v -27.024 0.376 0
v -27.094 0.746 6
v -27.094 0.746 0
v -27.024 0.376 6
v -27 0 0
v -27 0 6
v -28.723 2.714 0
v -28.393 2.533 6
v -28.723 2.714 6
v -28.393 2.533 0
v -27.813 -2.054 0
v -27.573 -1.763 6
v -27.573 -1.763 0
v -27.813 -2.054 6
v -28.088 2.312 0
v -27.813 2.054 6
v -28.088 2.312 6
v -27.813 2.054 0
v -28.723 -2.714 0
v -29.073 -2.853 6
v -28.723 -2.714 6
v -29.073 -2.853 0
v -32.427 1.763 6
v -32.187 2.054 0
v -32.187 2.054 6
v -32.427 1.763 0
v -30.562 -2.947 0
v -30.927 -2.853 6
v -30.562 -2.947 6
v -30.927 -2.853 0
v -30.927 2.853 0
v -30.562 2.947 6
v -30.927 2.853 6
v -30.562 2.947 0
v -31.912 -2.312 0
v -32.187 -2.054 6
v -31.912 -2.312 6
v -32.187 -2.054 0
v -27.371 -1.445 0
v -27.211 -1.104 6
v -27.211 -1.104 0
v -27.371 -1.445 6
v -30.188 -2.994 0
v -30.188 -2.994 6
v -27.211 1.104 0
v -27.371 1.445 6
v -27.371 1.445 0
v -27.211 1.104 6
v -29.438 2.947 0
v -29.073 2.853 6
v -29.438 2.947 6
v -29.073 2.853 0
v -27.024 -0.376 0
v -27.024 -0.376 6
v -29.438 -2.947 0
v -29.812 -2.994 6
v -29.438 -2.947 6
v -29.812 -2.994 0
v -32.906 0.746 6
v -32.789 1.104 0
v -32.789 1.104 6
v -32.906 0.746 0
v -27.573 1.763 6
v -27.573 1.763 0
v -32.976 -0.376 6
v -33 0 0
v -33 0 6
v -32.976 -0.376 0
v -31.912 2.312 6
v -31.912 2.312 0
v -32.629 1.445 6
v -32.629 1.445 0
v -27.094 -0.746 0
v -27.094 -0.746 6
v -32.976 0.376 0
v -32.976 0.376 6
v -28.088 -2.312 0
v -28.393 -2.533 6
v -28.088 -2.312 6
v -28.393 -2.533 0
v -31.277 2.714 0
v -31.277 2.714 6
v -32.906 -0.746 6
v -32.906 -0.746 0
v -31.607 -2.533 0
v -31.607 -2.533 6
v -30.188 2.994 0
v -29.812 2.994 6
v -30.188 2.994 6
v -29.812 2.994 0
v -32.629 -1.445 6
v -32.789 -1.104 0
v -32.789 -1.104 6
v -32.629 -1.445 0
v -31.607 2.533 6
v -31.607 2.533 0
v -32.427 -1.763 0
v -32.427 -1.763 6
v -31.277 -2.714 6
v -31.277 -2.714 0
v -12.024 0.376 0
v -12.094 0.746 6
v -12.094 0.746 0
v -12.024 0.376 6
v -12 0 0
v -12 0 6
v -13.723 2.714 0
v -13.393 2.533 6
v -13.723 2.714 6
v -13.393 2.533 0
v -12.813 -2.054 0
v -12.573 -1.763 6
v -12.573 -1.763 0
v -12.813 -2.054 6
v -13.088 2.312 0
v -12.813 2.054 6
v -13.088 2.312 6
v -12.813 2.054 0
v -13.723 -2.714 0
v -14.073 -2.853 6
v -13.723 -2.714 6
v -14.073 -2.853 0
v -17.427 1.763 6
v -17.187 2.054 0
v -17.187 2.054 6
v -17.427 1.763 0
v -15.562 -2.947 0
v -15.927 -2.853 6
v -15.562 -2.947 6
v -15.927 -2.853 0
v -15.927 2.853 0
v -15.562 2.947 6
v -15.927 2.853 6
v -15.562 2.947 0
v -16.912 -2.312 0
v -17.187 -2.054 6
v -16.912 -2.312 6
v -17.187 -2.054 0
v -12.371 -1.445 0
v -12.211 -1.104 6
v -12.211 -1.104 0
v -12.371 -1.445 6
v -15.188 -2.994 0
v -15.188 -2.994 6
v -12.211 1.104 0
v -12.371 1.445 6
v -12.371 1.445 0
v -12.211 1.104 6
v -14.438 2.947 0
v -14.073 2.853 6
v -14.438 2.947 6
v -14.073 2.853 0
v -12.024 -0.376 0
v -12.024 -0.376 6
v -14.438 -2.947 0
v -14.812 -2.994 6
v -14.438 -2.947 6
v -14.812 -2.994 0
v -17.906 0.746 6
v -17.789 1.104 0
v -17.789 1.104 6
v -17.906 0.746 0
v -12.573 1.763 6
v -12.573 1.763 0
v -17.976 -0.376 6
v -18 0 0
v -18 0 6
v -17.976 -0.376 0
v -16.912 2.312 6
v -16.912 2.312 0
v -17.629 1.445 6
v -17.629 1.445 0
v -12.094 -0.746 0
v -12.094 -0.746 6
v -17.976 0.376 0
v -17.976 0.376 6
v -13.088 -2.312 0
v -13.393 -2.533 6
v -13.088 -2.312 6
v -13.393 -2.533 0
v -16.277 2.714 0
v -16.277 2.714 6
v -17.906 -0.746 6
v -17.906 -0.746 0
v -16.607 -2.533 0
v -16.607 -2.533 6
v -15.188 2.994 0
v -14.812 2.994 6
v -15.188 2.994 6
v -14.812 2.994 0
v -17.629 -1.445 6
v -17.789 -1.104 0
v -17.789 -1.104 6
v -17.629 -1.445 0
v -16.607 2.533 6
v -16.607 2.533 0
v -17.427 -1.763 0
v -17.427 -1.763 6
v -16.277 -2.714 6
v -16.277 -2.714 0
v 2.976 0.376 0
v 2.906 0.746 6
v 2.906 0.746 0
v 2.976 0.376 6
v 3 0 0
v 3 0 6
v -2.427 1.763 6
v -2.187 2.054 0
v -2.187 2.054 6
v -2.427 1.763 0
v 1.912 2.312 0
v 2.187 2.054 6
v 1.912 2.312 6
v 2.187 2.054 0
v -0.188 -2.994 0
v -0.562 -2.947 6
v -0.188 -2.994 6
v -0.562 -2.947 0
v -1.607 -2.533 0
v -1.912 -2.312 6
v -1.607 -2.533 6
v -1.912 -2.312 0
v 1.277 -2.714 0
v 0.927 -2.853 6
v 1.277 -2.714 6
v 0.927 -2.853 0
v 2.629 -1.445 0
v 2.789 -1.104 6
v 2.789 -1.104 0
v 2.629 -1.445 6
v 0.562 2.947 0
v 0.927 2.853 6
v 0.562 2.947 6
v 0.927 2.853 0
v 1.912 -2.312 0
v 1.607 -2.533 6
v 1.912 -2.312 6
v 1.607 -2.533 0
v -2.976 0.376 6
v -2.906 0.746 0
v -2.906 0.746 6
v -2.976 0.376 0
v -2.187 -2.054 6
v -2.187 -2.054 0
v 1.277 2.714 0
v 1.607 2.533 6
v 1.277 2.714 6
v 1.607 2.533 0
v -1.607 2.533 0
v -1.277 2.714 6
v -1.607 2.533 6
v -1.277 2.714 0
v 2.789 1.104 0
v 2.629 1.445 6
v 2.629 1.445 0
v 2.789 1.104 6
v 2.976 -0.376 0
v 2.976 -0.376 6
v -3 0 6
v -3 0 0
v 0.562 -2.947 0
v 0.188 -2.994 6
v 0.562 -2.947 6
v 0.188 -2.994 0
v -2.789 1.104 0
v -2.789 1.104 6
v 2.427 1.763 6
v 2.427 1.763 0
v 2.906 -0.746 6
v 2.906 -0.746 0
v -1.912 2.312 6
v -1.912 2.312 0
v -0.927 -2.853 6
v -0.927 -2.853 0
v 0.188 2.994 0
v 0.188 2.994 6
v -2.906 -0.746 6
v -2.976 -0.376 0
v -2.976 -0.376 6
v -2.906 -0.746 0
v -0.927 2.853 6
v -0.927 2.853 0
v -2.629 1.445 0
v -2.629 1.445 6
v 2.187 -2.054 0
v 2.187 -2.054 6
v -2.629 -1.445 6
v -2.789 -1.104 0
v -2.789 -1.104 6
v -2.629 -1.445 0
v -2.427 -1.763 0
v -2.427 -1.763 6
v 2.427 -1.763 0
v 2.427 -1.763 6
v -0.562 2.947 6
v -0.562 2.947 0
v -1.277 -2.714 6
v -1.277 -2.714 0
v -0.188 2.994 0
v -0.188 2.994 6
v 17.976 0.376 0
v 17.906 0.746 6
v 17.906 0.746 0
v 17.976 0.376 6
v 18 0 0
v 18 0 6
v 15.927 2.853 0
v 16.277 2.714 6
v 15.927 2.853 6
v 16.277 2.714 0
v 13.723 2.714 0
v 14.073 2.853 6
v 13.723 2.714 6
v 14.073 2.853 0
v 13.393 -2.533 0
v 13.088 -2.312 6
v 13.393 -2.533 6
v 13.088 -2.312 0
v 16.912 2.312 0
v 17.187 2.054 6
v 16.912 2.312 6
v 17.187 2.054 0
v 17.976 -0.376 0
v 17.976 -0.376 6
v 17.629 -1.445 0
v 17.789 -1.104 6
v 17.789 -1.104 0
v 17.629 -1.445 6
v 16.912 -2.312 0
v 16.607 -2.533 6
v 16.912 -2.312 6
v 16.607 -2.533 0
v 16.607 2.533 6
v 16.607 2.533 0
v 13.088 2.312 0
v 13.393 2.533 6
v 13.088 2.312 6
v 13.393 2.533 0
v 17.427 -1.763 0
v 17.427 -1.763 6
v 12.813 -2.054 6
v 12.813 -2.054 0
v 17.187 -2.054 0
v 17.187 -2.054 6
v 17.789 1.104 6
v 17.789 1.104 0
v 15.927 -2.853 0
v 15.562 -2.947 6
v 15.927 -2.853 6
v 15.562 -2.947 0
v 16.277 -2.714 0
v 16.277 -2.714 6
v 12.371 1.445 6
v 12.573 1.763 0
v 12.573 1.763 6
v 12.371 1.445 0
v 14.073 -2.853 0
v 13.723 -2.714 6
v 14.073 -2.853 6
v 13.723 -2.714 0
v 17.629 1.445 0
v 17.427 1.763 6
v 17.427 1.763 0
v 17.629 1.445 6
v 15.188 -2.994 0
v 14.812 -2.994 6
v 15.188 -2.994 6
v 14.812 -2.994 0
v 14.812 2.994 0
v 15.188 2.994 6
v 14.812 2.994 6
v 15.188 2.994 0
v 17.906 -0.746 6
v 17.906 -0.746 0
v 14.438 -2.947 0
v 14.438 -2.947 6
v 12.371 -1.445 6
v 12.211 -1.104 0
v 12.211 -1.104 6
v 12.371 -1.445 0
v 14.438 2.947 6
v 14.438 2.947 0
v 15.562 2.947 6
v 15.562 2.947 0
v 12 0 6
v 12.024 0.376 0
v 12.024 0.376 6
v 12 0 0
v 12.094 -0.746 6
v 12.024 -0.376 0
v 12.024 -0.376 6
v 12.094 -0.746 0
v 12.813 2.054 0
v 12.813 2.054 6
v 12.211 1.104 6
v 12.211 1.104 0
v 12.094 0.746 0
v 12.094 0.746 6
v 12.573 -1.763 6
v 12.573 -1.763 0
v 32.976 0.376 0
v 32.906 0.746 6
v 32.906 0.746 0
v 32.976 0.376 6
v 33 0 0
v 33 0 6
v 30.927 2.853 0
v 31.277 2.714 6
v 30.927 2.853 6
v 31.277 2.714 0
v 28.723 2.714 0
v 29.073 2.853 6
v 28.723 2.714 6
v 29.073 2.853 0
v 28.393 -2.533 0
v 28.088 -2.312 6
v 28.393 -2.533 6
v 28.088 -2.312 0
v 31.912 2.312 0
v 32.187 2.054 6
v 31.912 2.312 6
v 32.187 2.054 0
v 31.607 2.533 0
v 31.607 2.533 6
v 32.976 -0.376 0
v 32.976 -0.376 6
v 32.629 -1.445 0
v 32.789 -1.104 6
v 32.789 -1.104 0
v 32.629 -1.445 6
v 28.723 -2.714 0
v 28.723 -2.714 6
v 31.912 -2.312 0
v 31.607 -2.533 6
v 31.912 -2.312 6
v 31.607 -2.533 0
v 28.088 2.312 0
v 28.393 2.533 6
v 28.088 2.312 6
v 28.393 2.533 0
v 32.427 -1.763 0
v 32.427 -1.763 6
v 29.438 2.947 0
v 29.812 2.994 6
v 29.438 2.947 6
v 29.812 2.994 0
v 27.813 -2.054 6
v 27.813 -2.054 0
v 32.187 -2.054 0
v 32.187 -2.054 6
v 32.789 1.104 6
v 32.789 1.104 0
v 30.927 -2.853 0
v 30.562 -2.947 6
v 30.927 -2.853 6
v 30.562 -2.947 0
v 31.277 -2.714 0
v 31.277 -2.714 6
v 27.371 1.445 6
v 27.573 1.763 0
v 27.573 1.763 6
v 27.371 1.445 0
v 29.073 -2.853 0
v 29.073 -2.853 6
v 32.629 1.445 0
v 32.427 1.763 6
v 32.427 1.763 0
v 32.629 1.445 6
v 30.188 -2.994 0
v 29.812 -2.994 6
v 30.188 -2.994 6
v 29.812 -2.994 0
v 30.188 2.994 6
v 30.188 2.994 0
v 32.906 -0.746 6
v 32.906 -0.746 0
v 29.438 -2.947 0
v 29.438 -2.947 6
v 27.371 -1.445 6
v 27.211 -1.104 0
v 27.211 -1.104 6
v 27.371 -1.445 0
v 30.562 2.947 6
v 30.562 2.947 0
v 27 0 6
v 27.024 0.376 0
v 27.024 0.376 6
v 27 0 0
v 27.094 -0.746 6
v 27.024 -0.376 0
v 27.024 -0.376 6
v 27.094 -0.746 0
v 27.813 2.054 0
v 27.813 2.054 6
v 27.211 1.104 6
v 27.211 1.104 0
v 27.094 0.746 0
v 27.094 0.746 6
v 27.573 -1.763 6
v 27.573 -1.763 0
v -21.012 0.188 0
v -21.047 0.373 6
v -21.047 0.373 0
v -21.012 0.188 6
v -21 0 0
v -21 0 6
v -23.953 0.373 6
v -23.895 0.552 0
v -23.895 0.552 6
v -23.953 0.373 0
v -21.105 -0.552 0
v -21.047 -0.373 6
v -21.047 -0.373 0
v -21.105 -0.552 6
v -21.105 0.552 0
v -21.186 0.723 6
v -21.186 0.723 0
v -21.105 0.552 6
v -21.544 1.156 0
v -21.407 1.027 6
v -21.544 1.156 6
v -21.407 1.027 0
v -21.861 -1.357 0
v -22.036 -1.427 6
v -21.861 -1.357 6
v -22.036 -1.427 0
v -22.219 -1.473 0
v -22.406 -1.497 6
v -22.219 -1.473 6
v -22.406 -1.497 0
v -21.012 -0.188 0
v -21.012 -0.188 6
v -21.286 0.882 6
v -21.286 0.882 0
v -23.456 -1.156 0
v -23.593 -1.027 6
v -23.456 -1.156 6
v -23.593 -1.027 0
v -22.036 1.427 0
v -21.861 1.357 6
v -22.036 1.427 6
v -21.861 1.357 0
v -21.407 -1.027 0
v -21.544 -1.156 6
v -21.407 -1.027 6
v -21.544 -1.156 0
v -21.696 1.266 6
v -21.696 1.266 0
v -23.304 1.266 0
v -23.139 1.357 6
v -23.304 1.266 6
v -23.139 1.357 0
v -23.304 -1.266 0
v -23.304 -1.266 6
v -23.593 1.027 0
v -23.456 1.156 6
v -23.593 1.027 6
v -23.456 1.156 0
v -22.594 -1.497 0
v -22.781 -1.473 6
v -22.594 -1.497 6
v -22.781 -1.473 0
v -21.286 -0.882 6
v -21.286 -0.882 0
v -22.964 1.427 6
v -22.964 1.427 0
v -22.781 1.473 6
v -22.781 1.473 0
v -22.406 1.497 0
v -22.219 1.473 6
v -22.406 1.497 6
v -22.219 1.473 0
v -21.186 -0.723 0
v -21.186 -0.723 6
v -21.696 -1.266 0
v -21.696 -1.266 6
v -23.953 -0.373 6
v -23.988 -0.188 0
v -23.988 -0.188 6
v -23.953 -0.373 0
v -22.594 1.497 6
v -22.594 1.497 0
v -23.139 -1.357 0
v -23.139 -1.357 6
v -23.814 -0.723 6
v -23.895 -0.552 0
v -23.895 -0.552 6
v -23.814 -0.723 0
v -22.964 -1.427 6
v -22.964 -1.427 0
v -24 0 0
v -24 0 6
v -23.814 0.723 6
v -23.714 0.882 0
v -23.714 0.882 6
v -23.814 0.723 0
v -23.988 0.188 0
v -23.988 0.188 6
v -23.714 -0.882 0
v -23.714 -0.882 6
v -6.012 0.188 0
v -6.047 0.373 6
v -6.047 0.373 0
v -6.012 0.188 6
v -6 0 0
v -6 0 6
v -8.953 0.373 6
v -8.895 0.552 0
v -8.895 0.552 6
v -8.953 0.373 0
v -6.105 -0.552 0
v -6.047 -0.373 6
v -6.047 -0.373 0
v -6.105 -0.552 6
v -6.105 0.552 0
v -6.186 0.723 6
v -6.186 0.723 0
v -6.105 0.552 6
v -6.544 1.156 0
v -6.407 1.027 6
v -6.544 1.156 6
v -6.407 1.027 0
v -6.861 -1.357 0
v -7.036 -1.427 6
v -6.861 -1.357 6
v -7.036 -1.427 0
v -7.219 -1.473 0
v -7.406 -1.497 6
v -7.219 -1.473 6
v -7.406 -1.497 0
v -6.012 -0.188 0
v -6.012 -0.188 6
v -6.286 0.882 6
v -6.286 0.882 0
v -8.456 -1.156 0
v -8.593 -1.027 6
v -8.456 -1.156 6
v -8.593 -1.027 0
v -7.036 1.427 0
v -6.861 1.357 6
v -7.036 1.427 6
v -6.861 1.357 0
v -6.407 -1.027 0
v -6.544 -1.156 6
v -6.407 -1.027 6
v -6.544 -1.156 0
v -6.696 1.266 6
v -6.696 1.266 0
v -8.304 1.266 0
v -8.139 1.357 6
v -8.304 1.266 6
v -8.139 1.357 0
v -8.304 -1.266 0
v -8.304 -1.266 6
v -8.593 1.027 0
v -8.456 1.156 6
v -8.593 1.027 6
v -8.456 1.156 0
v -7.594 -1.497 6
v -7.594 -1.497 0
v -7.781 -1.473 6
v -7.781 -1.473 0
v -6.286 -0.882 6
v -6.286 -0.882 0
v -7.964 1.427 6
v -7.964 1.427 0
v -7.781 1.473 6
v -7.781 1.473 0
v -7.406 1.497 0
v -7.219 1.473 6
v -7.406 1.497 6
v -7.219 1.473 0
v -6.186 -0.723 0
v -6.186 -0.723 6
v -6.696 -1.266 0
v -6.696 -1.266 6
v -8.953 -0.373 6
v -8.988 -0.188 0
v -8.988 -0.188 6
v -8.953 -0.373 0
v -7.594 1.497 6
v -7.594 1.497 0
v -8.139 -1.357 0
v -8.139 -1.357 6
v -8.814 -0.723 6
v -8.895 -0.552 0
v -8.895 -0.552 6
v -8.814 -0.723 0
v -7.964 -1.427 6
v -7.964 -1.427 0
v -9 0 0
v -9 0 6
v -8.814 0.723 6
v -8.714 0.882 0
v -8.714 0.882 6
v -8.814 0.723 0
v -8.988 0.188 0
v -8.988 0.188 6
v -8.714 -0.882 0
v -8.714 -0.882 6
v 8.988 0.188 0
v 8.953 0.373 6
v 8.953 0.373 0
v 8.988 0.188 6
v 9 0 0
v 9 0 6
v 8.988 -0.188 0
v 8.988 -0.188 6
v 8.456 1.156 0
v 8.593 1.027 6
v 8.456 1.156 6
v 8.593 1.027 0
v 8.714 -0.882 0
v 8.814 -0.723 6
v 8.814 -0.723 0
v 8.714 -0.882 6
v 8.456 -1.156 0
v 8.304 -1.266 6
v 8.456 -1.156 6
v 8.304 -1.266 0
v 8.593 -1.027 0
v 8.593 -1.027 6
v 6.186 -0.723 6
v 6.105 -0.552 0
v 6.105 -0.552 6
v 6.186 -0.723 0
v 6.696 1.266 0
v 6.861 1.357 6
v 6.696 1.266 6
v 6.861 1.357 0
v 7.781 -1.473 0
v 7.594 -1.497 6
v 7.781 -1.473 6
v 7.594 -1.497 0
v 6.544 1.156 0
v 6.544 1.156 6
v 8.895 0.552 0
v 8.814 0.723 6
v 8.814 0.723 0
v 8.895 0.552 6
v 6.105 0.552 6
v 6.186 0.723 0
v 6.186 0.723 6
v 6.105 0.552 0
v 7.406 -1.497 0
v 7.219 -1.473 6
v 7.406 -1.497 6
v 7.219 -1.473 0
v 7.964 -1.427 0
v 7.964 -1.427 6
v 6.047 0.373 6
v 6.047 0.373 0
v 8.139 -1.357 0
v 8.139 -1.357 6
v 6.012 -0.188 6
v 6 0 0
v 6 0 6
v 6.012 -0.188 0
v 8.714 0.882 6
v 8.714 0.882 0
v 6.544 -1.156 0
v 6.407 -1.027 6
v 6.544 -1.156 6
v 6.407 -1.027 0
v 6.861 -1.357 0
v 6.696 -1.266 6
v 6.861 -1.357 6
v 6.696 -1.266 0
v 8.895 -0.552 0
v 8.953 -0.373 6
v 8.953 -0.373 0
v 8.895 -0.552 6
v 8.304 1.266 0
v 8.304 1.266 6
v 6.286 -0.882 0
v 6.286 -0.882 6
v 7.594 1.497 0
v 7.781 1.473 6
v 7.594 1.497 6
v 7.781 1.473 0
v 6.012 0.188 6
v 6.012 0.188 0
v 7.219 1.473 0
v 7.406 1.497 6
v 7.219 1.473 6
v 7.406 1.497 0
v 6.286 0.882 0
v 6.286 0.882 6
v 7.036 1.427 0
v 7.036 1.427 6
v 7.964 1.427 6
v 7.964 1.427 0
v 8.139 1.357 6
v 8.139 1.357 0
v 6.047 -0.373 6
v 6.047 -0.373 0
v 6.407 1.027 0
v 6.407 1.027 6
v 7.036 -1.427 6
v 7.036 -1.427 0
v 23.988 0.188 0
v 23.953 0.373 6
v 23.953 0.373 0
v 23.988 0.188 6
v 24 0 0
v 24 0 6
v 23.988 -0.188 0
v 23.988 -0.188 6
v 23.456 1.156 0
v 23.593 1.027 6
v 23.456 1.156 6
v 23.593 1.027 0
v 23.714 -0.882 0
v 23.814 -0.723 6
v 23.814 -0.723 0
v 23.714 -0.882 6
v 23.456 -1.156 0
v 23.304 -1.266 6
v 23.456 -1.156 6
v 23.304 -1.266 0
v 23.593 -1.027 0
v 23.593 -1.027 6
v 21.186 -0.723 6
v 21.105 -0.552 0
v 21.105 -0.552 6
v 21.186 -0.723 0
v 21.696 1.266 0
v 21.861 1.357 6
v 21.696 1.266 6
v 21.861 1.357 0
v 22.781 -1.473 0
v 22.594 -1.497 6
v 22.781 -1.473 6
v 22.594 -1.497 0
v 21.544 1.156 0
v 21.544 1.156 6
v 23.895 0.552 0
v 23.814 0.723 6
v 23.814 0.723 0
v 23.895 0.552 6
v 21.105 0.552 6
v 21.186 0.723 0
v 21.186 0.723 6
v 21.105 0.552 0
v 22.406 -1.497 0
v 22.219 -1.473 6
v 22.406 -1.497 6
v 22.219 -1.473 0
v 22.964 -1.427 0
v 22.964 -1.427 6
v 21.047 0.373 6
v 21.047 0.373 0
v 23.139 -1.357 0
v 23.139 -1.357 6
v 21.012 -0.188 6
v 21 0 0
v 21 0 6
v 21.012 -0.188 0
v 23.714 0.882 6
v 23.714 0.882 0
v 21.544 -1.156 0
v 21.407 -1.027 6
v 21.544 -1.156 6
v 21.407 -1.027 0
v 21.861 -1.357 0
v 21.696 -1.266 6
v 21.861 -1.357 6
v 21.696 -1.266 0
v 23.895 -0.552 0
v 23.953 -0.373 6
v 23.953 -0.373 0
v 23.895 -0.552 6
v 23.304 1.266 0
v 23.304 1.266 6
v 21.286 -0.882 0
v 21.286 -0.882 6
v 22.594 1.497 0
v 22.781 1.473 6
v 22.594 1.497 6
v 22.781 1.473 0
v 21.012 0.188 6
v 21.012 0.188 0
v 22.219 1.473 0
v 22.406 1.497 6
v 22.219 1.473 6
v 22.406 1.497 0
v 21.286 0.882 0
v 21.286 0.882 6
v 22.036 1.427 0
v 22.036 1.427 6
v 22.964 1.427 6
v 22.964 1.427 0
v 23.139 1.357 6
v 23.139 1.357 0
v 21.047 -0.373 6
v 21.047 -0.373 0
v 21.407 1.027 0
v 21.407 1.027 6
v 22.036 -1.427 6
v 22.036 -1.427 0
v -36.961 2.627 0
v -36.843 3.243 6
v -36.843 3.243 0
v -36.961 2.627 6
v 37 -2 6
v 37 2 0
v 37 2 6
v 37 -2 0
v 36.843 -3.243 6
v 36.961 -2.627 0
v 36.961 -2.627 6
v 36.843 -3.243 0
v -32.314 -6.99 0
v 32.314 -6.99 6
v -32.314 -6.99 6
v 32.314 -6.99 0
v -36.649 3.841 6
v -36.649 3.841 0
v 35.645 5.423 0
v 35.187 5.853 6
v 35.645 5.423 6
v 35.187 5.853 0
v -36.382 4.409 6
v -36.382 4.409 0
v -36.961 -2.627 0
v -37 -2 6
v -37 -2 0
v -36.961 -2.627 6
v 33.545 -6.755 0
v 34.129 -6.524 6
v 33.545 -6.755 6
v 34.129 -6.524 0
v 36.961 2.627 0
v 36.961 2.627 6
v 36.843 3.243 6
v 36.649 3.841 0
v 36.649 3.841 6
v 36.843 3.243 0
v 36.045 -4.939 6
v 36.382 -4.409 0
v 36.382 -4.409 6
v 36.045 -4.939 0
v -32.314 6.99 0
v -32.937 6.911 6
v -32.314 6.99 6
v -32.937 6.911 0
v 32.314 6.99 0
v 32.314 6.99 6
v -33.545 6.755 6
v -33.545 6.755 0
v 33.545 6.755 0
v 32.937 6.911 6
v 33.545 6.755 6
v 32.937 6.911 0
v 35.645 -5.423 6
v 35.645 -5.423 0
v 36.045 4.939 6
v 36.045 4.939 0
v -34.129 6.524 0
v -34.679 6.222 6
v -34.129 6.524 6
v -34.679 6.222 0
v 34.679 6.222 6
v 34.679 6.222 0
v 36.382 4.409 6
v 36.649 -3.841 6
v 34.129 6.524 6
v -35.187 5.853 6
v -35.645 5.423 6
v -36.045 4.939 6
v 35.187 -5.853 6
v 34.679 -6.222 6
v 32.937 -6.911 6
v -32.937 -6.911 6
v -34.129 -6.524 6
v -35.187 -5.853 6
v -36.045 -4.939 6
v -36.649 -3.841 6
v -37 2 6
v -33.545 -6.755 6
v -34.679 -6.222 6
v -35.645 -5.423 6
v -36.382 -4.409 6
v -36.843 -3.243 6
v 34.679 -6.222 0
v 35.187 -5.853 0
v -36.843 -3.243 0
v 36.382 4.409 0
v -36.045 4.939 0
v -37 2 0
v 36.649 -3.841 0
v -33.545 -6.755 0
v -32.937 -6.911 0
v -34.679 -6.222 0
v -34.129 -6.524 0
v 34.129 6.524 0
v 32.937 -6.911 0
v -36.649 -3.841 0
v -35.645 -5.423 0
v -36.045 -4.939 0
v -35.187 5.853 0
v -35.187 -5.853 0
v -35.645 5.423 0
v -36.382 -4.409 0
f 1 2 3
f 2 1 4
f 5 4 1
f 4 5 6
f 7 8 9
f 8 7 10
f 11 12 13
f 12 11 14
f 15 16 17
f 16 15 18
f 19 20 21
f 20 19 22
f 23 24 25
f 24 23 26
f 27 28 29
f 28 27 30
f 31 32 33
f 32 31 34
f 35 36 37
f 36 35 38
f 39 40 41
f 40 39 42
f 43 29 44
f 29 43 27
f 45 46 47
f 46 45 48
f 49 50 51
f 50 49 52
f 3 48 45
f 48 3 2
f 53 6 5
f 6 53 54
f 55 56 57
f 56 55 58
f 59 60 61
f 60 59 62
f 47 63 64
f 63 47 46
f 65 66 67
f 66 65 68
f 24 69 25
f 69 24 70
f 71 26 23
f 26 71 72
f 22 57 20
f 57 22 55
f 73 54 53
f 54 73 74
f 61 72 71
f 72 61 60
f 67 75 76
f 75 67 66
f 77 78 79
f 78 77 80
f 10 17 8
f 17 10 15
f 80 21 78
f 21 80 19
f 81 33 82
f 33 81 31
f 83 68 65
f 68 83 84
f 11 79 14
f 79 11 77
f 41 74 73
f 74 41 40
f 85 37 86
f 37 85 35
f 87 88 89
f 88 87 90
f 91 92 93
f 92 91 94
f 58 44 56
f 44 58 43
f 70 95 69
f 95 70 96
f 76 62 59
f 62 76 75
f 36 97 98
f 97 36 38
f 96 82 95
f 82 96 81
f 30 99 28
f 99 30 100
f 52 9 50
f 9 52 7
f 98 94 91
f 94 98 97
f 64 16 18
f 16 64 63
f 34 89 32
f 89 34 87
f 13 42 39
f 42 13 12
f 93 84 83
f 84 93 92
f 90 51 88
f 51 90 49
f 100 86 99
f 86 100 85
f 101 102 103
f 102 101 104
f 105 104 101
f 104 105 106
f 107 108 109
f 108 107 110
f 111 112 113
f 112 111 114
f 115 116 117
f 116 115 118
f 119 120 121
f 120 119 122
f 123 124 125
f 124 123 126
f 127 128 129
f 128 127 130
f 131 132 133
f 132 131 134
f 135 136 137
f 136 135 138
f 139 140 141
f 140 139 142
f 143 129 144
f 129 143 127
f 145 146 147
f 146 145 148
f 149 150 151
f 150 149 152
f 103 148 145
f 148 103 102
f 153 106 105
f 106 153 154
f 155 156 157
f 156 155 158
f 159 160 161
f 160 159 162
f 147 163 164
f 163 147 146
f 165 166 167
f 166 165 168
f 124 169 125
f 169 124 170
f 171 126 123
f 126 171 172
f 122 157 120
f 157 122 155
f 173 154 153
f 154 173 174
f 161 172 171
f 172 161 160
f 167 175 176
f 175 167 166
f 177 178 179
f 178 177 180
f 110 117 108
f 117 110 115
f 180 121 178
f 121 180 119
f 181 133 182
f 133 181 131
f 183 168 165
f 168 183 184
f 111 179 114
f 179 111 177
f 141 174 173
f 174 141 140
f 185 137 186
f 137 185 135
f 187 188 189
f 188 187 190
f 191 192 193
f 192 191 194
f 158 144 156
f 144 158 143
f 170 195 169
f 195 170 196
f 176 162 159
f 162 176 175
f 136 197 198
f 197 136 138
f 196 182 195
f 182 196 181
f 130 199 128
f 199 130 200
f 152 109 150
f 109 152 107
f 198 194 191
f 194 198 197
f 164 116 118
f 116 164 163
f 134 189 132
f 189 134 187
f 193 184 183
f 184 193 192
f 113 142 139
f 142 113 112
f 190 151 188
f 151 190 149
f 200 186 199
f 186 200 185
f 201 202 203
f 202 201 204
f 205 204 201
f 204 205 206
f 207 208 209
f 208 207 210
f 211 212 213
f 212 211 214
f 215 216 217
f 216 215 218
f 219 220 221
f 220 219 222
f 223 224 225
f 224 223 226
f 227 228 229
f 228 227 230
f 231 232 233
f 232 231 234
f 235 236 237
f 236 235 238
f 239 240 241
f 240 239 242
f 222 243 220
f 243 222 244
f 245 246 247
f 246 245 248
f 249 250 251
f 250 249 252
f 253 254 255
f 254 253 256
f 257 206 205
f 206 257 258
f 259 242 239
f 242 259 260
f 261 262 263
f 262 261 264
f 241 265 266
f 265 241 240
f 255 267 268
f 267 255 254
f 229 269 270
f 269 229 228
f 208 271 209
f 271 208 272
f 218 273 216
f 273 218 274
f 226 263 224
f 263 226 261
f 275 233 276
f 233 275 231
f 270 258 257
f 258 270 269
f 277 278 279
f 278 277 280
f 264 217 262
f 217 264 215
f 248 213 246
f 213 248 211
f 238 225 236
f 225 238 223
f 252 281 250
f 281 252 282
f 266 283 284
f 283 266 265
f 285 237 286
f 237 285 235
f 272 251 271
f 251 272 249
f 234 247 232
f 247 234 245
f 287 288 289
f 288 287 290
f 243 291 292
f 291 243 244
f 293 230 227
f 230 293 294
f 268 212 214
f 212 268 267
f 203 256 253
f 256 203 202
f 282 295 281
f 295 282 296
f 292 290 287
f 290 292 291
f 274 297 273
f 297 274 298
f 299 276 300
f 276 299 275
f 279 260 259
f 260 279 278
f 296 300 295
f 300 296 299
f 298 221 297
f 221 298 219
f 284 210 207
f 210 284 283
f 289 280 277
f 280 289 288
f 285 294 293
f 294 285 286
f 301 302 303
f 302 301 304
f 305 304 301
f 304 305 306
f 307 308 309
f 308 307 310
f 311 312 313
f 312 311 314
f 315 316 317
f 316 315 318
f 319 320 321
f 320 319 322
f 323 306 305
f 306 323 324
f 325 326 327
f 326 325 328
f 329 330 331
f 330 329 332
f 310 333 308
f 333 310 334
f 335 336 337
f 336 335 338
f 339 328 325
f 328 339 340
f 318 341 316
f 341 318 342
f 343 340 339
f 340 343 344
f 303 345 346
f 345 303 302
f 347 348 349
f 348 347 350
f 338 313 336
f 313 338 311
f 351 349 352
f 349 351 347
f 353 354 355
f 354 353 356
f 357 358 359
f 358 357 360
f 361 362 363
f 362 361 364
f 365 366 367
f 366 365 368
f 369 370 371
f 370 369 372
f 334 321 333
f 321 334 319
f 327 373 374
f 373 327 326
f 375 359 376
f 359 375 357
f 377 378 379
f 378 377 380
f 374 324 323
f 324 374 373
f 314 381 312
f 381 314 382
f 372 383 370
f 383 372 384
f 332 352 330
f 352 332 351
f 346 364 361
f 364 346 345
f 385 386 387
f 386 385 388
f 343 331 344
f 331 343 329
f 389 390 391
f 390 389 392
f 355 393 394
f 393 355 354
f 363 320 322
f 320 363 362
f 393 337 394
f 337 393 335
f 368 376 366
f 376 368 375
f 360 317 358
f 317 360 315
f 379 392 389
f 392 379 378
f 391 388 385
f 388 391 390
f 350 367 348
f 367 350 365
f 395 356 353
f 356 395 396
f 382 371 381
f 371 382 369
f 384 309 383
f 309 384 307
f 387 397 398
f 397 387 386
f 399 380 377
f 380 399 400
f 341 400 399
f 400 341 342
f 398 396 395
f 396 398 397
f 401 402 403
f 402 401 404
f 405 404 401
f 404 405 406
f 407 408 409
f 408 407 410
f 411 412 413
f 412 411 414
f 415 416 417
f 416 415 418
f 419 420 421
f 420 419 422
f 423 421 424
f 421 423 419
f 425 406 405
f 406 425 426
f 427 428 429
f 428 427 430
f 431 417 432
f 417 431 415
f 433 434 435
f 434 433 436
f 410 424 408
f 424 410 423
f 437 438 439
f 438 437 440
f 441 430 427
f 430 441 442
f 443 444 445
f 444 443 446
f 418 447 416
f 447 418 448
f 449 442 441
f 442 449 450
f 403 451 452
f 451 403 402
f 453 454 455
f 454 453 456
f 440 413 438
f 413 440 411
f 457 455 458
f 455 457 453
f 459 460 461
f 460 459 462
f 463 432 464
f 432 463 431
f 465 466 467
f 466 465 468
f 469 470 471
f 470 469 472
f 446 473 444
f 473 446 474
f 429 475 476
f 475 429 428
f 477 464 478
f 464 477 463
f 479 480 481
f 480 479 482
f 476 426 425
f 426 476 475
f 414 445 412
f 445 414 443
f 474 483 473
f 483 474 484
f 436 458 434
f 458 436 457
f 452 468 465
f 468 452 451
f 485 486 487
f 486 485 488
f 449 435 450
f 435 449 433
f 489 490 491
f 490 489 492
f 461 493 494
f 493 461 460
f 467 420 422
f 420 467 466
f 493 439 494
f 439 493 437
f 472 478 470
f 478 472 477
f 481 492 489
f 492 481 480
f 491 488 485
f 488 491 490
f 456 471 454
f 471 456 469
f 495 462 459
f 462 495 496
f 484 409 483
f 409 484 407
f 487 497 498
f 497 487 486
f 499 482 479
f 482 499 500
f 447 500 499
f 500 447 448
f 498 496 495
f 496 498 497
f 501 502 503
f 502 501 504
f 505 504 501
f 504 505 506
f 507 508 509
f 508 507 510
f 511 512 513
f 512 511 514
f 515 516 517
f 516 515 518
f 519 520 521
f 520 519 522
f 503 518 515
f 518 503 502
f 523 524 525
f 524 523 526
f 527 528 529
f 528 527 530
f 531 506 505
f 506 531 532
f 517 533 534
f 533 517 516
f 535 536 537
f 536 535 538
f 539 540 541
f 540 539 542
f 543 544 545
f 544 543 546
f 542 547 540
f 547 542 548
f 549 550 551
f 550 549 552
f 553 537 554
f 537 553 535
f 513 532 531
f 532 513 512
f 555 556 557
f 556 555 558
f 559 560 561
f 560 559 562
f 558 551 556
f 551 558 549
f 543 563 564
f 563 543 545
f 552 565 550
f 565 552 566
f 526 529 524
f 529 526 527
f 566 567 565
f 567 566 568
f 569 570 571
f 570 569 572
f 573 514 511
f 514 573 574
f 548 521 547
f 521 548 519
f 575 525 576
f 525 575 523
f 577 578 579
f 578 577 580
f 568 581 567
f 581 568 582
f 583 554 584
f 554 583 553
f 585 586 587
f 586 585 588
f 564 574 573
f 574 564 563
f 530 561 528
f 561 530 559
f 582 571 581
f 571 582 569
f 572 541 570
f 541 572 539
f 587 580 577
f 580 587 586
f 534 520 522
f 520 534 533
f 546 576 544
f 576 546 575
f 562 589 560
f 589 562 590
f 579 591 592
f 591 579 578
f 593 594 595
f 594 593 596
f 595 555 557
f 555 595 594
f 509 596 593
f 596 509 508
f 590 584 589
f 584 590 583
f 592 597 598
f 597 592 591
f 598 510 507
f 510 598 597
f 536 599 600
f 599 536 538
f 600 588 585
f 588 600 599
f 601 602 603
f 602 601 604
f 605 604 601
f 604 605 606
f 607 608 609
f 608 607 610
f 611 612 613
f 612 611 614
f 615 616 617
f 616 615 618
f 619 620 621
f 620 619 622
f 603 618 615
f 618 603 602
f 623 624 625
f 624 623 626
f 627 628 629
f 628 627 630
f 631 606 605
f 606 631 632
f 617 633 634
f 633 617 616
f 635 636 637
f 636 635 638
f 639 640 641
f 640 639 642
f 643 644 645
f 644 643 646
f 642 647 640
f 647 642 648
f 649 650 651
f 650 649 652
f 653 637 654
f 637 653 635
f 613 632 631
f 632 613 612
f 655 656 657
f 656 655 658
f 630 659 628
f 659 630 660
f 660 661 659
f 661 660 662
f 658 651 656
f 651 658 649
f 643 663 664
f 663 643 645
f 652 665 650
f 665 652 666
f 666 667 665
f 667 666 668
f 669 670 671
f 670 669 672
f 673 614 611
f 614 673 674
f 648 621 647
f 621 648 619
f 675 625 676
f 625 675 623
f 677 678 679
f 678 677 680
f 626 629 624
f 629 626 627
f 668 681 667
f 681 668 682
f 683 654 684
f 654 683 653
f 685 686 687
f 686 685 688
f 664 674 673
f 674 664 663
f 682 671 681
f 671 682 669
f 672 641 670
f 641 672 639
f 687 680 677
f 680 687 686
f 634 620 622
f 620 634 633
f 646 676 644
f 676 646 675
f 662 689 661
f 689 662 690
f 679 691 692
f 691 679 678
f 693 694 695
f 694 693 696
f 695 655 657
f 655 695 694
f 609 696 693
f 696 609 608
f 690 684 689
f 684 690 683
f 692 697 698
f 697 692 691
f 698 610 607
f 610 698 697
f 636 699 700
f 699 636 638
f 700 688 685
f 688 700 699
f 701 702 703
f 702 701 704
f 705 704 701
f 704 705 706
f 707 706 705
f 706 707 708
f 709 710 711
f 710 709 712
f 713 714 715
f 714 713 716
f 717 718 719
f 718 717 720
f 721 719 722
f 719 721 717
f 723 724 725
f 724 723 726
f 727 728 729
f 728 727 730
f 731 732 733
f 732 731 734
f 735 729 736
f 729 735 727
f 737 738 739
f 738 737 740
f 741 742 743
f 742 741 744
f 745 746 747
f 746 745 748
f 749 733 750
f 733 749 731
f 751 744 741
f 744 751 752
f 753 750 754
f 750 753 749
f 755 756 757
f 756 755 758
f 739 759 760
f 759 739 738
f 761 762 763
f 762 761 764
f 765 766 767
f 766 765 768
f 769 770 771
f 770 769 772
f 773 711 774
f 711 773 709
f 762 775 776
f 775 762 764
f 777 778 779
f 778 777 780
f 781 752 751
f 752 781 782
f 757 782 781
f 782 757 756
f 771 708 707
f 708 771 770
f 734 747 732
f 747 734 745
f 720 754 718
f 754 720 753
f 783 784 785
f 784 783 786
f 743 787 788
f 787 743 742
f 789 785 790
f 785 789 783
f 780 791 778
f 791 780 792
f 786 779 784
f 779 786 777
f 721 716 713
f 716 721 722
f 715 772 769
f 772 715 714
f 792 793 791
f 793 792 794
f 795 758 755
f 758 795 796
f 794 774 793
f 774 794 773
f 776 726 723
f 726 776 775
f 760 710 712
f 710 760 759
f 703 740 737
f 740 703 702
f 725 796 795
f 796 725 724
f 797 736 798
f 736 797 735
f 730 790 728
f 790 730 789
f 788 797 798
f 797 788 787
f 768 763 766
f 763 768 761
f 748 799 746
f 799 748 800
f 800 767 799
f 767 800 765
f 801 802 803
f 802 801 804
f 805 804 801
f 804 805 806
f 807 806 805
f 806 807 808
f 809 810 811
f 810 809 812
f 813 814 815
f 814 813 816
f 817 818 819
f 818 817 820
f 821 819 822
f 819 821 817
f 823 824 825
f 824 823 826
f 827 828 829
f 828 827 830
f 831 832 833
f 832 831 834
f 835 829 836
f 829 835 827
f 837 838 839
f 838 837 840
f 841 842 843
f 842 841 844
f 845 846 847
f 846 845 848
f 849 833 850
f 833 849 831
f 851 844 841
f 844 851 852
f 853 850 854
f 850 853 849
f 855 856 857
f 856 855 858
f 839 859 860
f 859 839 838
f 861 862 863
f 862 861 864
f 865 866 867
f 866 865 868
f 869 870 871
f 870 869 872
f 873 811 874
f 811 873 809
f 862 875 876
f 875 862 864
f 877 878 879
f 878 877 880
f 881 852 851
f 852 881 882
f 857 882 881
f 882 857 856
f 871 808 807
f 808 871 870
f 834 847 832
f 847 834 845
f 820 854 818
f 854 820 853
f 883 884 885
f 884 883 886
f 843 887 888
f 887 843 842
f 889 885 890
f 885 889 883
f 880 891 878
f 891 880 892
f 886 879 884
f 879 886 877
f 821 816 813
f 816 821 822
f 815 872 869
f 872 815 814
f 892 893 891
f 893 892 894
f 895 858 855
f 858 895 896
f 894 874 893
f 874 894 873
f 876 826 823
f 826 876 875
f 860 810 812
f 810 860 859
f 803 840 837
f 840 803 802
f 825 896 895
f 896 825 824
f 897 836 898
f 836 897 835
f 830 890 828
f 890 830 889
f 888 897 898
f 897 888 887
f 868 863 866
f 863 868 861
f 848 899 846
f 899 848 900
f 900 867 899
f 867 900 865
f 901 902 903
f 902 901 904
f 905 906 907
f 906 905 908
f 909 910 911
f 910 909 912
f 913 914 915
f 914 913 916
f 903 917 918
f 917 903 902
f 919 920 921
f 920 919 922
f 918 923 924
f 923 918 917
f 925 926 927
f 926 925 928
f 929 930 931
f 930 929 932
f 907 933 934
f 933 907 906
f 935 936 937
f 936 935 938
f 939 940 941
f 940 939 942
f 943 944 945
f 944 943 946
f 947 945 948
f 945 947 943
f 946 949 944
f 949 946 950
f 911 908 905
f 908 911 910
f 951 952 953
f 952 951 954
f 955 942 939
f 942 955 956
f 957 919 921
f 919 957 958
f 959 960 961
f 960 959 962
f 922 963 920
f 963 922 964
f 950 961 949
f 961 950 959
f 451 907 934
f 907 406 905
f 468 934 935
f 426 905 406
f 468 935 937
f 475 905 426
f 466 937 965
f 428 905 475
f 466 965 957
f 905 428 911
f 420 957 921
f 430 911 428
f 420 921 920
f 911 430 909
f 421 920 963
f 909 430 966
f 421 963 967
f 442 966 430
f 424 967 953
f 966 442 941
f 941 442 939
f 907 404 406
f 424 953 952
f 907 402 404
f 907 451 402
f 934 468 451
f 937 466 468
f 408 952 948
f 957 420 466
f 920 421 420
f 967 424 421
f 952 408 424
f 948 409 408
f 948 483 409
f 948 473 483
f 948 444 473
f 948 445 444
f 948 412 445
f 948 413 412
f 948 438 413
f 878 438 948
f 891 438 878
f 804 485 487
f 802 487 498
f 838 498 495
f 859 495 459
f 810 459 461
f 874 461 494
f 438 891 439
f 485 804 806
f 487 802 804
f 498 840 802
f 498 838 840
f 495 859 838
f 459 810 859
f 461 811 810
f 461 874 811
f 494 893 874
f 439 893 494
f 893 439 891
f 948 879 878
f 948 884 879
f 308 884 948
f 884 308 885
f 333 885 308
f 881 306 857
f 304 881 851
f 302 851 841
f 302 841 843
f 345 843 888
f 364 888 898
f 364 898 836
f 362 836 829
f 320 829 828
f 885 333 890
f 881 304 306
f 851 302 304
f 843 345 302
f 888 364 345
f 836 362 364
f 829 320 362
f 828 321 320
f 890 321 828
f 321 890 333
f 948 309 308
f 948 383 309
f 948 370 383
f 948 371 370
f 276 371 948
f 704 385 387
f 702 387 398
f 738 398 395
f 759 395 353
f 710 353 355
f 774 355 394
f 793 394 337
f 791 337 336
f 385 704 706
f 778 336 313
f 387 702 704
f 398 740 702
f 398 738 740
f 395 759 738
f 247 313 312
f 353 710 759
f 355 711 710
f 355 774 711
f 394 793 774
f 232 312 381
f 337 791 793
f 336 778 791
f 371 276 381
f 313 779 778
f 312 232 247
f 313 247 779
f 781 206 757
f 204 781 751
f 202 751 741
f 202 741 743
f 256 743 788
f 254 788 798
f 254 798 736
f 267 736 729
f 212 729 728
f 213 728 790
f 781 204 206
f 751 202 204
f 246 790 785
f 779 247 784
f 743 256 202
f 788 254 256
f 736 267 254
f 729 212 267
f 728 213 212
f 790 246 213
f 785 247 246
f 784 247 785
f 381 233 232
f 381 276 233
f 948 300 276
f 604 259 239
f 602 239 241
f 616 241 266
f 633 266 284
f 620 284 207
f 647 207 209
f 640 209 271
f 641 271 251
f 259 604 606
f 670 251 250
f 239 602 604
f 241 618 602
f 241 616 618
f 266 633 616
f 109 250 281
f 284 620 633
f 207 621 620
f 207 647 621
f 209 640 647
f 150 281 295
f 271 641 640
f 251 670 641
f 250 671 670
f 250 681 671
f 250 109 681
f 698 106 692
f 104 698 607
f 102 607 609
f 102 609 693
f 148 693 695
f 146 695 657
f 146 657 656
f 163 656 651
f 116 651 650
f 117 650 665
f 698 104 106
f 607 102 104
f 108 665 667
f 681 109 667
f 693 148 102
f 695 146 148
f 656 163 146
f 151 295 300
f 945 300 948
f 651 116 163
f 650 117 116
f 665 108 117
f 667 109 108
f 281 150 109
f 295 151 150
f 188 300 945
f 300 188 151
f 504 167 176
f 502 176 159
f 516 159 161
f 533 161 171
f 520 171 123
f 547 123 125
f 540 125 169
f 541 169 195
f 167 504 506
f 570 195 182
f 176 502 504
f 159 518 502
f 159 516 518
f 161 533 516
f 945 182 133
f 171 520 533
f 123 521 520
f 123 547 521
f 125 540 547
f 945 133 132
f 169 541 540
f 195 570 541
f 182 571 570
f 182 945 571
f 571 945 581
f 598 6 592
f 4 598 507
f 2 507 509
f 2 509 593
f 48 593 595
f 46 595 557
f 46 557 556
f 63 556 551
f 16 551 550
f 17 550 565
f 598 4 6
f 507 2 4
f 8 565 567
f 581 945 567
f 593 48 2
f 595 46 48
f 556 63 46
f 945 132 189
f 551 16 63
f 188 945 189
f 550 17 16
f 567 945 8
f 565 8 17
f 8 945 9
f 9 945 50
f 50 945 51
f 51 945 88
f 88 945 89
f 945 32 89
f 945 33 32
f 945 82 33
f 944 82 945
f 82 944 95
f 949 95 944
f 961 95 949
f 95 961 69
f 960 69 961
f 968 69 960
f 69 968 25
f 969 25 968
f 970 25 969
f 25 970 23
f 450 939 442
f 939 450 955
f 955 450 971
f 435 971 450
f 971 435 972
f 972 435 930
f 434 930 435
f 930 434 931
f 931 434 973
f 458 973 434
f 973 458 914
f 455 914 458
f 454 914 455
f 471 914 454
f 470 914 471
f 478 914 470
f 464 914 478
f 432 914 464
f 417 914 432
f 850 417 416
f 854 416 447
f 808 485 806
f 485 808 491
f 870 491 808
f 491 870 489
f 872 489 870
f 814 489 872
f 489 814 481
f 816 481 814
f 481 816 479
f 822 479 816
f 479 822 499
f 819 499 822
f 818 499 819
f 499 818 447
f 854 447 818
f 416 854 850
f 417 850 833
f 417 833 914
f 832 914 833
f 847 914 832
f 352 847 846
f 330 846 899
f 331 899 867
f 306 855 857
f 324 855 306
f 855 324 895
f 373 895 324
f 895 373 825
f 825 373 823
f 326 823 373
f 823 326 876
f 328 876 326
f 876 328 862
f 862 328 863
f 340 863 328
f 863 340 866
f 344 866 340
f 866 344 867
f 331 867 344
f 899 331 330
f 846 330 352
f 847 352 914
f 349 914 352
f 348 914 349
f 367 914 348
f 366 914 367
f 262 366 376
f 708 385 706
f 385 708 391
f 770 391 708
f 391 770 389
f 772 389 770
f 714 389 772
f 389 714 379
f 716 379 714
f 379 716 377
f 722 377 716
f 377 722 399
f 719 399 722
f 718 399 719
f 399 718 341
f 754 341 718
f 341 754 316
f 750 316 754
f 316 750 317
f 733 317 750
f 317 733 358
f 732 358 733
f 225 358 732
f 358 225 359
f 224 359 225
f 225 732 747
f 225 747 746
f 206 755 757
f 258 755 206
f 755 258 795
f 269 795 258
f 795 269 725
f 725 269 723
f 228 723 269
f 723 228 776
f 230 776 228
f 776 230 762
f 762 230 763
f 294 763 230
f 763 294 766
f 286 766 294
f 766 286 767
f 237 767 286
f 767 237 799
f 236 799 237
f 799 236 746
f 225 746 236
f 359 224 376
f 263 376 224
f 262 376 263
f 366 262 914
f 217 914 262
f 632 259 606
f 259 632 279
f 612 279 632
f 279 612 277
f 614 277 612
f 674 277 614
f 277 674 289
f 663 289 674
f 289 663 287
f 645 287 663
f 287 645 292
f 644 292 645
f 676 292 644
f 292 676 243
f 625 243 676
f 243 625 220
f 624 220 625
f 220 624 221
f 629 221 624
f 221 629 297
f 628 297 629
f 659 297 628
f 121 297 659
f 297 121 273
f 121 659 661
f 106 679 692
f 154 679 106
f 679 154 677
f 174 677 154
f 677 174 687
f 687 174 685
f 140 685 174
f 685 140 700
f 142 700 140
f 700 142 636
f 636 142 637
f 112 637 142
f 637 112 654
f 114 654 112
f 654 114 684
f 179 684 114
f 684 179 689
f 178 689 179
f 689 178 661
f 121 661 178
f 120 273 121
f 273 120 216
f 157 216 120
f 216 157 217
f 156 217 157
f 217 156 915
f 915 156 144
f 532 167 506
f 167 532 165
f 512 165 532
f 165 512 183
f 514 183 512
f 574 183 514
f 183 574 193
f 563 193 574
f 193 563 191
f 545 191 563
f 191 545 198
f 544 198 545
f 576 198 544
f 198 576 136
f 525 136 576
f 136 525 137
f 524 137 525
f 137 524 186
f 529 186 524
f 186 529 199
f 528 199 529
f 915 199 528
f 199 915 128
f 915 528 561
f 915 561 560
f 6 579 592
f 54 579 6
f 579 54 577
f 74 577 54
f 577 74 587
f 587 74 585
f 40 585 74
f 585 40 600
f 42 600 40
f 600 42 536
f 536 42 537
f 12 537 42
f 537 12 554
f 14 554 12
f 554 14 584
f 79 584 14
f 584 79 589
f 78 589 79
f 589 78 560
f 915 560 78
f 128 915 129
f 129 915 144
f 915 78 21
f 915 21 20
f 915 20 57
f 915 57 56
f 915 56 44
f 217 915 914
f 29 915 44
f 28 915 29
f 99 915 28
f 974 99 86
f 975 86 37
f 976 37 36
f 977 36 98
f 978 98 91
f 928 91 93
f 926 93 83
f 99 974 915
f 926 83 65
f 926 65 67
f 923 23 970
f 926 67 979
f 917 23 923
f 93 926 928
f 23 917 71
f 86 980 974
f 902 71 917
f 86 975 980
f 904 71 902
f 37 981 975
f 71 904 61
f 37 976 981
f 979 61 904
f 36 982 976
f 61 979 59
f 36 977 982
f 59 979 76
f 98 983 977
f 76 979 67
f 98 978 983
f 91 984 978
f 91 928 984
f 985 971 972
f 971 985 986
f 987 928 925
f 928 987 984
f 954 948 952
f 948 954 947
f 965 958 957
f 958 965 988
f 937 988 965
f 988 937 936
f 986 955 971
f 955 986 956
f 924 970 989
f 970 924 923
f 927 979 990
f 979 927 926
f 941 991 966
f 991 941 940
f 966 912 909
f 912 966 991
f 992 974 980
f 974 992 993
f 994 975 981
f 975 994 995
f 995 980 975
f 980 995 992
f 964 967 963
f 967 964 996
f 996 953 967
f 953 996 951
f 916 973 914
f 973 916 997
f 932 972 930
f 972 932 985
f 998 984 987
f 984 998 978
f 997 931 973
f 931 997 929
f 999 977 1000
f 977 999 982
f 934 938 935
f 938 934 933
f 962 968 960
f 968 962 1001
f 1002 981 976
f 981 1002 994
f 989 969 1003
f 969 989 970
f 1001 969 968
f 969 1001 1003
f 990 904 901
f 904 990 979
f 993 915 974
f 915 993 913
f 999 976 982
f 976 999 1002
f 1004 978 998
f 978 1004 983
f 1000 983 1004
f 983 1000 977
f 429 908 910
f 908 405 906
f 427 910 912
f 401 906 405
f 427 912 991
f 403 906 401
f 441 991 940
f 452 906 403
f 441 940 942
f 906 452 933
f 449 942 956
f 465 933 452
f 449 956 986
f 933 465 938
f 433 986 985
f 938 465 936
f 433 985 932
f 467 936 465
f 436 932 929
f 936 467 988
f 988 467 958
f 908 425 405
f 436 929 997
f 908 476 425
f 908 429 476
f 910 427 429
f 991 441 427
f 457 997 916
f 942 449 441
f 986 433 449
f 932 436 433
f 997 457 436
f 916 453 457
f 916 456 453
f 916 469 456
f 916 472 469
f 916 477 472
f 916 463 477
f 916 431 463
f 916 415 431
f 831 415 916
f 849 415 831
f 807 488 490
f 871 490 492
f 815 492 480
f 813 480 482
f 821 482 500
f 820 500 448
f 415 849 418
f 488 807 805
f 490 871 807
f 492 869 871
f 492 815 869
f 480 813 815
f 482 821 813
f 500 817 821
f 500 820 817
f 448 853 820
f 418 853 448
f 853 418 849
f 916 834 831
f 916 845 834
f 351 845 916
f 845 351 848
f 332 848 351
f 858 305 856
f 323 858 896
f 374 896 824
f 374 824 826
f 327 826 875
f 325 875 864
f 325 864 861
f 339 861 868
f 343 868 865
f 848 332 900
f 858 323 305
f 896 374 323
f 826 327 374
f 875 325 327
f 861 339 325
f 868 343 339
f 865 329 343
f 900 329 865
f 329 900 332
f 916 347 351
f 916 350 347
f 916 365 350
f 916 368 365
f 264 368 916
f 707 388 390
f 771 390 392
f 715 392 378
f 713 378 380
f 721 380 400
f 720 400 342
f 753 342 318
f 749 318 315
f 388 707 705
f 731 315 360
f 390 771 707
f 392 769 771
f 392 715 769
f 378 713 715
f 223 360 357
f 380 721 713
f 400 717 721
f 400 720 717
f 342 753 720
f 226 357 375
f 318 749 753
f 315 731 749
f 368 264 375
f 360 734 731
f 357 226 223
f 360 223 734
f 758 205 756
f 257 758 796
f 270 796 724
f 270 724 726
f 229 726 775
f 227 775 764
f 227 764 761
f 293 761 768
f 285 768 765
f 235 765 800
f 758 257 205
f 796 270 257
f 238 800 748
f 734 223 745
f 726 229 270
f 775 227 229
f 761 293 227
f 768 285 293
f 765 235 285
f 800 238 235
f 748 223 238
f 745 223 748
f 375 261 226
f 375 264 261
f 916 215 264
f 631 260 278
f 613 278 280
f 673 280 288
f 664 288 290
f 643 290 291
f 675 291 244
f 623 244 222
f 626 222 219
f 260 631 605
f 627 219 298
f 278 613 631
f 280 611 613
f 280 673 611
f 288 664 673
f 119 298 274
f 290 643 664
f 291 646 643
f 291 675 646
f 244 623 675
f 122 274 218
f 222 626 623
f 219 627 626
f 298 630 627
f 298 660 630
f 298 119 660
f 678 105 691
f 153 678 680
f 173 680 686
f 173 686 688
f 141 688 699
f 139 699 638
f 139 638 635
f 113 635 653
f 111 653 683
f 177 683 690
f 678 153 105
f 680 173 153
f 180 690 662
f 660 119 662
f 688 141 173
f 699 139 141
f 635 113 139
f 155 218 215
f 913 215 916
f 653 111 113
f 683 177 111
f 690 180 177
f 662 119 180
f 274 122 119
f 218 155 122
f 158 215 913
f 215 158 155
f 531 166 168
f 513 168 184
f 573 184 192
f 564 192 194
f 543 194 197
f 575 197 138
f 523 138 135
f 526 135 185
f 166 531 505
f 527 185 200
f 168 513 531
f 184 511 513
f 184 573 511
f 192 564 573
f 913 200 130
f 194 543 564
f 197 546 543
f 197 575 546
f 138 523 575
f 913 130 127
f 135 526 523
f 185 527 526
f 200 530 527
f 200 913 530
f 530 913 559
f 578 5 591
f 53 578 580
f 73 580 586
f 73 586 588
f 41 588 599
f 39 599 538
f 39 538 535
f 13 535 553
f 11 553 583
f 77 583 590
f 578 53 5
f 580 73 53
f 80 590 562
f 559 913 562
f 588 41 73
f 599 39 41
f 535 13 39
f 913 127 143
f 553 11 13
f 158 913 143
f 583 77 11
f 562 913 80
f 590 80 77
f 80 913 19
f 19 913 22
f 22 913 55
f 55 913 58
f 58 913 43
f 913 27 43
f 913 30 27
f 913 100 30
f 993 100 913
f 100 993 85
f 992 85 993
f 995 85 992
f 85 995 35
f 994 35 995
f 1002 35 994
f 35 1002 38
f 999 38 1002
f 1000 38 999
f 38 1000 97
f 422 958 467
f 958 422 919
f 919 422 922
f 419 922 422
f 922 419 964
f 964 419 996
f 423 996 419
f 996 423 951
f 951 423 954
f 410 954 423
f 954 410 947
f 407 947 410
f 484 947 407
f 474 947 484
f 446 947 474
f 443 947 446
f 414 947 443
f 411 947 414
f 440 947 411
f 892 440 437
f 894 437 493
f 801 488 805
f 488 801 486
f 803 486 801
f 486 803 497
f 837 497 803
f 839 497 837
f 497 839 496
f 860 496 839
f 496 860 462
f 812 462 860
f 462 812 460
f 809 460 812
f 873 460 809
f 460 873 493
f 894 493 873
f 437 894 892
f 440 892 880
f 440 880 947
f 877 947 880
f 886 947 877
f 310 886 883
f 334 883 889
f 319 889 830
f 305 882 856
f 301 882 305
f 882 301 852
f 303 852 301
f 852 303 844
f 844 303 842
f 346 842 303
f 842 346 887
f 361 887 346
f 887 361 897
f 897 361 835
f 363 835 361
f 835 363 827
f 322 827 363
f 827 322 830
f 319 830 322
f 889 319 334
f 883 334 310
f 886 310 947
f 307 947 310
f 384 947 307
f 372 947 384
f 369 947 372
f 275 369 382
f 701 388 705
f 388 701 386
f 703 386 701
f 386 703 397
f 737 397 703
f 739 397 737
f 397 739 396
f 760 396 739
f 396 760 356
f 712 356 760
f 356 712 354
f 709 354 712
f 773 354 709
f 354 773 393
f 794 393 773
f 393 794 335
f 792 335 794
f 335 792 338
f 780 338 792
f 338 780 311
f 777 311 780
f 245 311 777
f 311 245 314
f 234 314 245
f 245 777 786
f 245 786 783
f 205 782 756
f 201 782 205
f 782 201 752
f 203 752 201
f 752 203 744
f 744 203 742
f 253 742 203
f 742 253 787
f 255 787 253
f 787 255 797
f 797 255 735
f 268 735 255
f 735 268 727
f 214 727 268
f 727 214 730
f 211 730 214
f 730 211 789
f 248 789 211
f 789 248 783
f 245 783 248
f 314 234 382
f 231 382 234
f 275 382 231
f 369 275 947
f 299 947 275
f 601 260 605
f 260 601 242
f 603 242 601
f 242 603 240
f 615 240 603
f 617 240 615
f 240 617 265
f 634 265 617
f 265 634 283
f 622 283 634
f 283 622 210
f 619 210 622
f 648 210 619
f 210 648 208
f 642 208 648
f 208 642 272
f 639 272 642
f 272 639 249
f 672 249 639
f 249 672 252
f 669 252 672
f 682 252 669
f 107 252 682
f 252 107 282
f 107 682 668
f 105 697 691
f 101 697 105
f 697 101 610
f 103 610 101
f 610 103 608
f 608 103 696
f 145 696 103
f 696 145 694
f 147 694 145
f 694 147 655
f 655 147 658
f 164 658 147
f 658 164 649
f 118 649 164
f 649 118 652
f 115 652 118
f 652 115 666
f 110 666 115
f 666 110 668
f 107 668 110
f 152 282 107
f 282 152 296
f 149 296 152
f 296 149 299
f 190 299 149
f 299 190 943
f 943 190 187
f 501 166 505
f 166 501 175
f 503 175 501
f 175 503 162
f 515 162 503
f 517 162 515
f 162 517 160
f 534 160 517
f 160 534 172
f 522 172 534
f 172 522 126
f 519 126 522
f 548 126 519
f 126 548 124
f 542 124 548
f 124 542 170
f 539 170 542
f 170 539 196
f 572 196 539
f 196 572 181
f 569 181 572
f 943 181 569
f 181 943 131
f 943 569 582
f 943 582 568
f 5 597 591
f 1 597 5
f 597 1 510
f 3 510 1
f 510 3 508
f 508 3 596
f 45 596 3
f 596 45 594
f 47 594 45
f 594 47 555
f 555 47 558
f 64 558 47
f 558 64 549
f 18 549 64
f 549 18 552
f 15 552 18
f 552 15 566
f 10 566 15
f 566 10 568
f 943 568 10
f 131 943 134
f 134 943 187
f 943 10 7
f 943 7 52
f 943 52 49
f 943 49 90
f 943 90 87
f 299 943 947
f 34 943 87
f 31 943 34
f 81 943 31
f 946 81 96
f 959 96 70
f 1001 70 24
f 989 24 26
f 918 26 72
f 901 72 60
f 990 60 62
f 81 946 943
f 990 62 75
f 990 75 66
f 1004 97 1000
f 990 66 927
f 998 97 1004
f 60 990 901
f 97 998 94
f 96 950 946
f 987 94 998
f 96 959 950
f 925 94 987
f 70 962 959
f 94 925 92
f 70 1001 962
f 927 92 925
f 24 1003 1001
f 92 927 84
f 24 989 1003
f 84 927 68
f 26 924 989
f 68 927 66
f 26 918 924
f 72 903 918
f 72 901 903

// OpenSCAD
$fn = 50;


difference() {
	union() {
		hull() {
			translate(v = [-32.0000000000, 2.0000000000, 0]) {
				cylinder(h = 6, r = 5);
			}
			translate(v = [32.0000000000, 2.0000000000, 0]) {
				cylinder(h = 6, r = 5);
			}
			translate(v = [-32.0000000000, -2.0000000000, 0]) {
				cylinder(h = 6, r = 5);
			}
			translate(v = [32.0000000000, -2.0000000000, 0]) {
				cylinder(h = 6, r = 5);
			}
		}
	}
	union() {
		translate(v = [-30.0000000000, 0.0000000000, 0]) {
			translate(v = [0, 0, -100]) {
				cylinder(h = 200, r = 3.0000000000);
			}
		}
		translate(v = [-15.0000000000, 0.0000000000, 0]) {
			translate(v = [0, 0, -100]) {
				cylinder(h = 200, r = 3.0000000000);
			}
		}
		translate(v = [0, 0, -100]) {
			cylinder(h = 200, r = 3.0000000000);
		}
		translate(v = [15.0000000000, 0.0000000000, 0]) {
			translate(v = [0, 0, -100]) {
				cylinder(h = 200, r = 3.0000000000);
			}
		}
		translate(v = [30.0000000000, 0.0000000000, 0]) {
			translate(v = [0, 0, -100]) {
				cylinder(h = 200, r = 3.0000000000);
			}
		}
		translate(v = [-30.0000000000, 0.0000000000, 0]) {
			translate(v = [0, 0, -100]) {
				cylinder(h = 200, r = 1.5000000000);
			}
		}
		translate(v = [-22.5000000000, 0.0000000000, 0]) {
			translate(v = [0, 0, -100]) {
				cylinder(h = 200, r = 1.5000000000);
			}
		}
		translate(v = [-15.0000000000, 0.0000000000, 0]) {
			translate(v = [0, 0, -100]) {
				cylinder(h = 200, r = 1.5000000000);
			}
		}
		translate(v = [-7.5000000000, 0.0000000000, 0]) {
			translate(v = [0, 0, -100]) {
				cylinder(h = 200, r = 1.5000000000);
			}
		}
		translate(v = [0, 0, -100]) {
			cylinder(h = 200, r = 1.5000000000);
		}
		translate(v = [7.5000000000, 0.0000000000, 0]) {
			translate(v = [0, 0, -100]) {
				cylinder(h = 200, r = 1.5000000000);
			}
		}
		translate(v = [15.0000000000, 0.0000000000, 0]) {
			translate(v = [0, 0, -100]) {
				cylinder(h = 200, r = 1.5000000000);
			}
		}
		translate(v = [22.5000000000, 0.0000000000, 0]) {
			translate(v = [0, 0, -100]) {
				cylinder(h = 200, r = 1.5000000000);
			}
		}
		translate(v = [30.0000000000, 0.0000000000, 0]) {
			translate(v = [0, 0, -100]) {
				cylinder(h = 200, r = 1.5000000000);
			}
		}
	}
}
